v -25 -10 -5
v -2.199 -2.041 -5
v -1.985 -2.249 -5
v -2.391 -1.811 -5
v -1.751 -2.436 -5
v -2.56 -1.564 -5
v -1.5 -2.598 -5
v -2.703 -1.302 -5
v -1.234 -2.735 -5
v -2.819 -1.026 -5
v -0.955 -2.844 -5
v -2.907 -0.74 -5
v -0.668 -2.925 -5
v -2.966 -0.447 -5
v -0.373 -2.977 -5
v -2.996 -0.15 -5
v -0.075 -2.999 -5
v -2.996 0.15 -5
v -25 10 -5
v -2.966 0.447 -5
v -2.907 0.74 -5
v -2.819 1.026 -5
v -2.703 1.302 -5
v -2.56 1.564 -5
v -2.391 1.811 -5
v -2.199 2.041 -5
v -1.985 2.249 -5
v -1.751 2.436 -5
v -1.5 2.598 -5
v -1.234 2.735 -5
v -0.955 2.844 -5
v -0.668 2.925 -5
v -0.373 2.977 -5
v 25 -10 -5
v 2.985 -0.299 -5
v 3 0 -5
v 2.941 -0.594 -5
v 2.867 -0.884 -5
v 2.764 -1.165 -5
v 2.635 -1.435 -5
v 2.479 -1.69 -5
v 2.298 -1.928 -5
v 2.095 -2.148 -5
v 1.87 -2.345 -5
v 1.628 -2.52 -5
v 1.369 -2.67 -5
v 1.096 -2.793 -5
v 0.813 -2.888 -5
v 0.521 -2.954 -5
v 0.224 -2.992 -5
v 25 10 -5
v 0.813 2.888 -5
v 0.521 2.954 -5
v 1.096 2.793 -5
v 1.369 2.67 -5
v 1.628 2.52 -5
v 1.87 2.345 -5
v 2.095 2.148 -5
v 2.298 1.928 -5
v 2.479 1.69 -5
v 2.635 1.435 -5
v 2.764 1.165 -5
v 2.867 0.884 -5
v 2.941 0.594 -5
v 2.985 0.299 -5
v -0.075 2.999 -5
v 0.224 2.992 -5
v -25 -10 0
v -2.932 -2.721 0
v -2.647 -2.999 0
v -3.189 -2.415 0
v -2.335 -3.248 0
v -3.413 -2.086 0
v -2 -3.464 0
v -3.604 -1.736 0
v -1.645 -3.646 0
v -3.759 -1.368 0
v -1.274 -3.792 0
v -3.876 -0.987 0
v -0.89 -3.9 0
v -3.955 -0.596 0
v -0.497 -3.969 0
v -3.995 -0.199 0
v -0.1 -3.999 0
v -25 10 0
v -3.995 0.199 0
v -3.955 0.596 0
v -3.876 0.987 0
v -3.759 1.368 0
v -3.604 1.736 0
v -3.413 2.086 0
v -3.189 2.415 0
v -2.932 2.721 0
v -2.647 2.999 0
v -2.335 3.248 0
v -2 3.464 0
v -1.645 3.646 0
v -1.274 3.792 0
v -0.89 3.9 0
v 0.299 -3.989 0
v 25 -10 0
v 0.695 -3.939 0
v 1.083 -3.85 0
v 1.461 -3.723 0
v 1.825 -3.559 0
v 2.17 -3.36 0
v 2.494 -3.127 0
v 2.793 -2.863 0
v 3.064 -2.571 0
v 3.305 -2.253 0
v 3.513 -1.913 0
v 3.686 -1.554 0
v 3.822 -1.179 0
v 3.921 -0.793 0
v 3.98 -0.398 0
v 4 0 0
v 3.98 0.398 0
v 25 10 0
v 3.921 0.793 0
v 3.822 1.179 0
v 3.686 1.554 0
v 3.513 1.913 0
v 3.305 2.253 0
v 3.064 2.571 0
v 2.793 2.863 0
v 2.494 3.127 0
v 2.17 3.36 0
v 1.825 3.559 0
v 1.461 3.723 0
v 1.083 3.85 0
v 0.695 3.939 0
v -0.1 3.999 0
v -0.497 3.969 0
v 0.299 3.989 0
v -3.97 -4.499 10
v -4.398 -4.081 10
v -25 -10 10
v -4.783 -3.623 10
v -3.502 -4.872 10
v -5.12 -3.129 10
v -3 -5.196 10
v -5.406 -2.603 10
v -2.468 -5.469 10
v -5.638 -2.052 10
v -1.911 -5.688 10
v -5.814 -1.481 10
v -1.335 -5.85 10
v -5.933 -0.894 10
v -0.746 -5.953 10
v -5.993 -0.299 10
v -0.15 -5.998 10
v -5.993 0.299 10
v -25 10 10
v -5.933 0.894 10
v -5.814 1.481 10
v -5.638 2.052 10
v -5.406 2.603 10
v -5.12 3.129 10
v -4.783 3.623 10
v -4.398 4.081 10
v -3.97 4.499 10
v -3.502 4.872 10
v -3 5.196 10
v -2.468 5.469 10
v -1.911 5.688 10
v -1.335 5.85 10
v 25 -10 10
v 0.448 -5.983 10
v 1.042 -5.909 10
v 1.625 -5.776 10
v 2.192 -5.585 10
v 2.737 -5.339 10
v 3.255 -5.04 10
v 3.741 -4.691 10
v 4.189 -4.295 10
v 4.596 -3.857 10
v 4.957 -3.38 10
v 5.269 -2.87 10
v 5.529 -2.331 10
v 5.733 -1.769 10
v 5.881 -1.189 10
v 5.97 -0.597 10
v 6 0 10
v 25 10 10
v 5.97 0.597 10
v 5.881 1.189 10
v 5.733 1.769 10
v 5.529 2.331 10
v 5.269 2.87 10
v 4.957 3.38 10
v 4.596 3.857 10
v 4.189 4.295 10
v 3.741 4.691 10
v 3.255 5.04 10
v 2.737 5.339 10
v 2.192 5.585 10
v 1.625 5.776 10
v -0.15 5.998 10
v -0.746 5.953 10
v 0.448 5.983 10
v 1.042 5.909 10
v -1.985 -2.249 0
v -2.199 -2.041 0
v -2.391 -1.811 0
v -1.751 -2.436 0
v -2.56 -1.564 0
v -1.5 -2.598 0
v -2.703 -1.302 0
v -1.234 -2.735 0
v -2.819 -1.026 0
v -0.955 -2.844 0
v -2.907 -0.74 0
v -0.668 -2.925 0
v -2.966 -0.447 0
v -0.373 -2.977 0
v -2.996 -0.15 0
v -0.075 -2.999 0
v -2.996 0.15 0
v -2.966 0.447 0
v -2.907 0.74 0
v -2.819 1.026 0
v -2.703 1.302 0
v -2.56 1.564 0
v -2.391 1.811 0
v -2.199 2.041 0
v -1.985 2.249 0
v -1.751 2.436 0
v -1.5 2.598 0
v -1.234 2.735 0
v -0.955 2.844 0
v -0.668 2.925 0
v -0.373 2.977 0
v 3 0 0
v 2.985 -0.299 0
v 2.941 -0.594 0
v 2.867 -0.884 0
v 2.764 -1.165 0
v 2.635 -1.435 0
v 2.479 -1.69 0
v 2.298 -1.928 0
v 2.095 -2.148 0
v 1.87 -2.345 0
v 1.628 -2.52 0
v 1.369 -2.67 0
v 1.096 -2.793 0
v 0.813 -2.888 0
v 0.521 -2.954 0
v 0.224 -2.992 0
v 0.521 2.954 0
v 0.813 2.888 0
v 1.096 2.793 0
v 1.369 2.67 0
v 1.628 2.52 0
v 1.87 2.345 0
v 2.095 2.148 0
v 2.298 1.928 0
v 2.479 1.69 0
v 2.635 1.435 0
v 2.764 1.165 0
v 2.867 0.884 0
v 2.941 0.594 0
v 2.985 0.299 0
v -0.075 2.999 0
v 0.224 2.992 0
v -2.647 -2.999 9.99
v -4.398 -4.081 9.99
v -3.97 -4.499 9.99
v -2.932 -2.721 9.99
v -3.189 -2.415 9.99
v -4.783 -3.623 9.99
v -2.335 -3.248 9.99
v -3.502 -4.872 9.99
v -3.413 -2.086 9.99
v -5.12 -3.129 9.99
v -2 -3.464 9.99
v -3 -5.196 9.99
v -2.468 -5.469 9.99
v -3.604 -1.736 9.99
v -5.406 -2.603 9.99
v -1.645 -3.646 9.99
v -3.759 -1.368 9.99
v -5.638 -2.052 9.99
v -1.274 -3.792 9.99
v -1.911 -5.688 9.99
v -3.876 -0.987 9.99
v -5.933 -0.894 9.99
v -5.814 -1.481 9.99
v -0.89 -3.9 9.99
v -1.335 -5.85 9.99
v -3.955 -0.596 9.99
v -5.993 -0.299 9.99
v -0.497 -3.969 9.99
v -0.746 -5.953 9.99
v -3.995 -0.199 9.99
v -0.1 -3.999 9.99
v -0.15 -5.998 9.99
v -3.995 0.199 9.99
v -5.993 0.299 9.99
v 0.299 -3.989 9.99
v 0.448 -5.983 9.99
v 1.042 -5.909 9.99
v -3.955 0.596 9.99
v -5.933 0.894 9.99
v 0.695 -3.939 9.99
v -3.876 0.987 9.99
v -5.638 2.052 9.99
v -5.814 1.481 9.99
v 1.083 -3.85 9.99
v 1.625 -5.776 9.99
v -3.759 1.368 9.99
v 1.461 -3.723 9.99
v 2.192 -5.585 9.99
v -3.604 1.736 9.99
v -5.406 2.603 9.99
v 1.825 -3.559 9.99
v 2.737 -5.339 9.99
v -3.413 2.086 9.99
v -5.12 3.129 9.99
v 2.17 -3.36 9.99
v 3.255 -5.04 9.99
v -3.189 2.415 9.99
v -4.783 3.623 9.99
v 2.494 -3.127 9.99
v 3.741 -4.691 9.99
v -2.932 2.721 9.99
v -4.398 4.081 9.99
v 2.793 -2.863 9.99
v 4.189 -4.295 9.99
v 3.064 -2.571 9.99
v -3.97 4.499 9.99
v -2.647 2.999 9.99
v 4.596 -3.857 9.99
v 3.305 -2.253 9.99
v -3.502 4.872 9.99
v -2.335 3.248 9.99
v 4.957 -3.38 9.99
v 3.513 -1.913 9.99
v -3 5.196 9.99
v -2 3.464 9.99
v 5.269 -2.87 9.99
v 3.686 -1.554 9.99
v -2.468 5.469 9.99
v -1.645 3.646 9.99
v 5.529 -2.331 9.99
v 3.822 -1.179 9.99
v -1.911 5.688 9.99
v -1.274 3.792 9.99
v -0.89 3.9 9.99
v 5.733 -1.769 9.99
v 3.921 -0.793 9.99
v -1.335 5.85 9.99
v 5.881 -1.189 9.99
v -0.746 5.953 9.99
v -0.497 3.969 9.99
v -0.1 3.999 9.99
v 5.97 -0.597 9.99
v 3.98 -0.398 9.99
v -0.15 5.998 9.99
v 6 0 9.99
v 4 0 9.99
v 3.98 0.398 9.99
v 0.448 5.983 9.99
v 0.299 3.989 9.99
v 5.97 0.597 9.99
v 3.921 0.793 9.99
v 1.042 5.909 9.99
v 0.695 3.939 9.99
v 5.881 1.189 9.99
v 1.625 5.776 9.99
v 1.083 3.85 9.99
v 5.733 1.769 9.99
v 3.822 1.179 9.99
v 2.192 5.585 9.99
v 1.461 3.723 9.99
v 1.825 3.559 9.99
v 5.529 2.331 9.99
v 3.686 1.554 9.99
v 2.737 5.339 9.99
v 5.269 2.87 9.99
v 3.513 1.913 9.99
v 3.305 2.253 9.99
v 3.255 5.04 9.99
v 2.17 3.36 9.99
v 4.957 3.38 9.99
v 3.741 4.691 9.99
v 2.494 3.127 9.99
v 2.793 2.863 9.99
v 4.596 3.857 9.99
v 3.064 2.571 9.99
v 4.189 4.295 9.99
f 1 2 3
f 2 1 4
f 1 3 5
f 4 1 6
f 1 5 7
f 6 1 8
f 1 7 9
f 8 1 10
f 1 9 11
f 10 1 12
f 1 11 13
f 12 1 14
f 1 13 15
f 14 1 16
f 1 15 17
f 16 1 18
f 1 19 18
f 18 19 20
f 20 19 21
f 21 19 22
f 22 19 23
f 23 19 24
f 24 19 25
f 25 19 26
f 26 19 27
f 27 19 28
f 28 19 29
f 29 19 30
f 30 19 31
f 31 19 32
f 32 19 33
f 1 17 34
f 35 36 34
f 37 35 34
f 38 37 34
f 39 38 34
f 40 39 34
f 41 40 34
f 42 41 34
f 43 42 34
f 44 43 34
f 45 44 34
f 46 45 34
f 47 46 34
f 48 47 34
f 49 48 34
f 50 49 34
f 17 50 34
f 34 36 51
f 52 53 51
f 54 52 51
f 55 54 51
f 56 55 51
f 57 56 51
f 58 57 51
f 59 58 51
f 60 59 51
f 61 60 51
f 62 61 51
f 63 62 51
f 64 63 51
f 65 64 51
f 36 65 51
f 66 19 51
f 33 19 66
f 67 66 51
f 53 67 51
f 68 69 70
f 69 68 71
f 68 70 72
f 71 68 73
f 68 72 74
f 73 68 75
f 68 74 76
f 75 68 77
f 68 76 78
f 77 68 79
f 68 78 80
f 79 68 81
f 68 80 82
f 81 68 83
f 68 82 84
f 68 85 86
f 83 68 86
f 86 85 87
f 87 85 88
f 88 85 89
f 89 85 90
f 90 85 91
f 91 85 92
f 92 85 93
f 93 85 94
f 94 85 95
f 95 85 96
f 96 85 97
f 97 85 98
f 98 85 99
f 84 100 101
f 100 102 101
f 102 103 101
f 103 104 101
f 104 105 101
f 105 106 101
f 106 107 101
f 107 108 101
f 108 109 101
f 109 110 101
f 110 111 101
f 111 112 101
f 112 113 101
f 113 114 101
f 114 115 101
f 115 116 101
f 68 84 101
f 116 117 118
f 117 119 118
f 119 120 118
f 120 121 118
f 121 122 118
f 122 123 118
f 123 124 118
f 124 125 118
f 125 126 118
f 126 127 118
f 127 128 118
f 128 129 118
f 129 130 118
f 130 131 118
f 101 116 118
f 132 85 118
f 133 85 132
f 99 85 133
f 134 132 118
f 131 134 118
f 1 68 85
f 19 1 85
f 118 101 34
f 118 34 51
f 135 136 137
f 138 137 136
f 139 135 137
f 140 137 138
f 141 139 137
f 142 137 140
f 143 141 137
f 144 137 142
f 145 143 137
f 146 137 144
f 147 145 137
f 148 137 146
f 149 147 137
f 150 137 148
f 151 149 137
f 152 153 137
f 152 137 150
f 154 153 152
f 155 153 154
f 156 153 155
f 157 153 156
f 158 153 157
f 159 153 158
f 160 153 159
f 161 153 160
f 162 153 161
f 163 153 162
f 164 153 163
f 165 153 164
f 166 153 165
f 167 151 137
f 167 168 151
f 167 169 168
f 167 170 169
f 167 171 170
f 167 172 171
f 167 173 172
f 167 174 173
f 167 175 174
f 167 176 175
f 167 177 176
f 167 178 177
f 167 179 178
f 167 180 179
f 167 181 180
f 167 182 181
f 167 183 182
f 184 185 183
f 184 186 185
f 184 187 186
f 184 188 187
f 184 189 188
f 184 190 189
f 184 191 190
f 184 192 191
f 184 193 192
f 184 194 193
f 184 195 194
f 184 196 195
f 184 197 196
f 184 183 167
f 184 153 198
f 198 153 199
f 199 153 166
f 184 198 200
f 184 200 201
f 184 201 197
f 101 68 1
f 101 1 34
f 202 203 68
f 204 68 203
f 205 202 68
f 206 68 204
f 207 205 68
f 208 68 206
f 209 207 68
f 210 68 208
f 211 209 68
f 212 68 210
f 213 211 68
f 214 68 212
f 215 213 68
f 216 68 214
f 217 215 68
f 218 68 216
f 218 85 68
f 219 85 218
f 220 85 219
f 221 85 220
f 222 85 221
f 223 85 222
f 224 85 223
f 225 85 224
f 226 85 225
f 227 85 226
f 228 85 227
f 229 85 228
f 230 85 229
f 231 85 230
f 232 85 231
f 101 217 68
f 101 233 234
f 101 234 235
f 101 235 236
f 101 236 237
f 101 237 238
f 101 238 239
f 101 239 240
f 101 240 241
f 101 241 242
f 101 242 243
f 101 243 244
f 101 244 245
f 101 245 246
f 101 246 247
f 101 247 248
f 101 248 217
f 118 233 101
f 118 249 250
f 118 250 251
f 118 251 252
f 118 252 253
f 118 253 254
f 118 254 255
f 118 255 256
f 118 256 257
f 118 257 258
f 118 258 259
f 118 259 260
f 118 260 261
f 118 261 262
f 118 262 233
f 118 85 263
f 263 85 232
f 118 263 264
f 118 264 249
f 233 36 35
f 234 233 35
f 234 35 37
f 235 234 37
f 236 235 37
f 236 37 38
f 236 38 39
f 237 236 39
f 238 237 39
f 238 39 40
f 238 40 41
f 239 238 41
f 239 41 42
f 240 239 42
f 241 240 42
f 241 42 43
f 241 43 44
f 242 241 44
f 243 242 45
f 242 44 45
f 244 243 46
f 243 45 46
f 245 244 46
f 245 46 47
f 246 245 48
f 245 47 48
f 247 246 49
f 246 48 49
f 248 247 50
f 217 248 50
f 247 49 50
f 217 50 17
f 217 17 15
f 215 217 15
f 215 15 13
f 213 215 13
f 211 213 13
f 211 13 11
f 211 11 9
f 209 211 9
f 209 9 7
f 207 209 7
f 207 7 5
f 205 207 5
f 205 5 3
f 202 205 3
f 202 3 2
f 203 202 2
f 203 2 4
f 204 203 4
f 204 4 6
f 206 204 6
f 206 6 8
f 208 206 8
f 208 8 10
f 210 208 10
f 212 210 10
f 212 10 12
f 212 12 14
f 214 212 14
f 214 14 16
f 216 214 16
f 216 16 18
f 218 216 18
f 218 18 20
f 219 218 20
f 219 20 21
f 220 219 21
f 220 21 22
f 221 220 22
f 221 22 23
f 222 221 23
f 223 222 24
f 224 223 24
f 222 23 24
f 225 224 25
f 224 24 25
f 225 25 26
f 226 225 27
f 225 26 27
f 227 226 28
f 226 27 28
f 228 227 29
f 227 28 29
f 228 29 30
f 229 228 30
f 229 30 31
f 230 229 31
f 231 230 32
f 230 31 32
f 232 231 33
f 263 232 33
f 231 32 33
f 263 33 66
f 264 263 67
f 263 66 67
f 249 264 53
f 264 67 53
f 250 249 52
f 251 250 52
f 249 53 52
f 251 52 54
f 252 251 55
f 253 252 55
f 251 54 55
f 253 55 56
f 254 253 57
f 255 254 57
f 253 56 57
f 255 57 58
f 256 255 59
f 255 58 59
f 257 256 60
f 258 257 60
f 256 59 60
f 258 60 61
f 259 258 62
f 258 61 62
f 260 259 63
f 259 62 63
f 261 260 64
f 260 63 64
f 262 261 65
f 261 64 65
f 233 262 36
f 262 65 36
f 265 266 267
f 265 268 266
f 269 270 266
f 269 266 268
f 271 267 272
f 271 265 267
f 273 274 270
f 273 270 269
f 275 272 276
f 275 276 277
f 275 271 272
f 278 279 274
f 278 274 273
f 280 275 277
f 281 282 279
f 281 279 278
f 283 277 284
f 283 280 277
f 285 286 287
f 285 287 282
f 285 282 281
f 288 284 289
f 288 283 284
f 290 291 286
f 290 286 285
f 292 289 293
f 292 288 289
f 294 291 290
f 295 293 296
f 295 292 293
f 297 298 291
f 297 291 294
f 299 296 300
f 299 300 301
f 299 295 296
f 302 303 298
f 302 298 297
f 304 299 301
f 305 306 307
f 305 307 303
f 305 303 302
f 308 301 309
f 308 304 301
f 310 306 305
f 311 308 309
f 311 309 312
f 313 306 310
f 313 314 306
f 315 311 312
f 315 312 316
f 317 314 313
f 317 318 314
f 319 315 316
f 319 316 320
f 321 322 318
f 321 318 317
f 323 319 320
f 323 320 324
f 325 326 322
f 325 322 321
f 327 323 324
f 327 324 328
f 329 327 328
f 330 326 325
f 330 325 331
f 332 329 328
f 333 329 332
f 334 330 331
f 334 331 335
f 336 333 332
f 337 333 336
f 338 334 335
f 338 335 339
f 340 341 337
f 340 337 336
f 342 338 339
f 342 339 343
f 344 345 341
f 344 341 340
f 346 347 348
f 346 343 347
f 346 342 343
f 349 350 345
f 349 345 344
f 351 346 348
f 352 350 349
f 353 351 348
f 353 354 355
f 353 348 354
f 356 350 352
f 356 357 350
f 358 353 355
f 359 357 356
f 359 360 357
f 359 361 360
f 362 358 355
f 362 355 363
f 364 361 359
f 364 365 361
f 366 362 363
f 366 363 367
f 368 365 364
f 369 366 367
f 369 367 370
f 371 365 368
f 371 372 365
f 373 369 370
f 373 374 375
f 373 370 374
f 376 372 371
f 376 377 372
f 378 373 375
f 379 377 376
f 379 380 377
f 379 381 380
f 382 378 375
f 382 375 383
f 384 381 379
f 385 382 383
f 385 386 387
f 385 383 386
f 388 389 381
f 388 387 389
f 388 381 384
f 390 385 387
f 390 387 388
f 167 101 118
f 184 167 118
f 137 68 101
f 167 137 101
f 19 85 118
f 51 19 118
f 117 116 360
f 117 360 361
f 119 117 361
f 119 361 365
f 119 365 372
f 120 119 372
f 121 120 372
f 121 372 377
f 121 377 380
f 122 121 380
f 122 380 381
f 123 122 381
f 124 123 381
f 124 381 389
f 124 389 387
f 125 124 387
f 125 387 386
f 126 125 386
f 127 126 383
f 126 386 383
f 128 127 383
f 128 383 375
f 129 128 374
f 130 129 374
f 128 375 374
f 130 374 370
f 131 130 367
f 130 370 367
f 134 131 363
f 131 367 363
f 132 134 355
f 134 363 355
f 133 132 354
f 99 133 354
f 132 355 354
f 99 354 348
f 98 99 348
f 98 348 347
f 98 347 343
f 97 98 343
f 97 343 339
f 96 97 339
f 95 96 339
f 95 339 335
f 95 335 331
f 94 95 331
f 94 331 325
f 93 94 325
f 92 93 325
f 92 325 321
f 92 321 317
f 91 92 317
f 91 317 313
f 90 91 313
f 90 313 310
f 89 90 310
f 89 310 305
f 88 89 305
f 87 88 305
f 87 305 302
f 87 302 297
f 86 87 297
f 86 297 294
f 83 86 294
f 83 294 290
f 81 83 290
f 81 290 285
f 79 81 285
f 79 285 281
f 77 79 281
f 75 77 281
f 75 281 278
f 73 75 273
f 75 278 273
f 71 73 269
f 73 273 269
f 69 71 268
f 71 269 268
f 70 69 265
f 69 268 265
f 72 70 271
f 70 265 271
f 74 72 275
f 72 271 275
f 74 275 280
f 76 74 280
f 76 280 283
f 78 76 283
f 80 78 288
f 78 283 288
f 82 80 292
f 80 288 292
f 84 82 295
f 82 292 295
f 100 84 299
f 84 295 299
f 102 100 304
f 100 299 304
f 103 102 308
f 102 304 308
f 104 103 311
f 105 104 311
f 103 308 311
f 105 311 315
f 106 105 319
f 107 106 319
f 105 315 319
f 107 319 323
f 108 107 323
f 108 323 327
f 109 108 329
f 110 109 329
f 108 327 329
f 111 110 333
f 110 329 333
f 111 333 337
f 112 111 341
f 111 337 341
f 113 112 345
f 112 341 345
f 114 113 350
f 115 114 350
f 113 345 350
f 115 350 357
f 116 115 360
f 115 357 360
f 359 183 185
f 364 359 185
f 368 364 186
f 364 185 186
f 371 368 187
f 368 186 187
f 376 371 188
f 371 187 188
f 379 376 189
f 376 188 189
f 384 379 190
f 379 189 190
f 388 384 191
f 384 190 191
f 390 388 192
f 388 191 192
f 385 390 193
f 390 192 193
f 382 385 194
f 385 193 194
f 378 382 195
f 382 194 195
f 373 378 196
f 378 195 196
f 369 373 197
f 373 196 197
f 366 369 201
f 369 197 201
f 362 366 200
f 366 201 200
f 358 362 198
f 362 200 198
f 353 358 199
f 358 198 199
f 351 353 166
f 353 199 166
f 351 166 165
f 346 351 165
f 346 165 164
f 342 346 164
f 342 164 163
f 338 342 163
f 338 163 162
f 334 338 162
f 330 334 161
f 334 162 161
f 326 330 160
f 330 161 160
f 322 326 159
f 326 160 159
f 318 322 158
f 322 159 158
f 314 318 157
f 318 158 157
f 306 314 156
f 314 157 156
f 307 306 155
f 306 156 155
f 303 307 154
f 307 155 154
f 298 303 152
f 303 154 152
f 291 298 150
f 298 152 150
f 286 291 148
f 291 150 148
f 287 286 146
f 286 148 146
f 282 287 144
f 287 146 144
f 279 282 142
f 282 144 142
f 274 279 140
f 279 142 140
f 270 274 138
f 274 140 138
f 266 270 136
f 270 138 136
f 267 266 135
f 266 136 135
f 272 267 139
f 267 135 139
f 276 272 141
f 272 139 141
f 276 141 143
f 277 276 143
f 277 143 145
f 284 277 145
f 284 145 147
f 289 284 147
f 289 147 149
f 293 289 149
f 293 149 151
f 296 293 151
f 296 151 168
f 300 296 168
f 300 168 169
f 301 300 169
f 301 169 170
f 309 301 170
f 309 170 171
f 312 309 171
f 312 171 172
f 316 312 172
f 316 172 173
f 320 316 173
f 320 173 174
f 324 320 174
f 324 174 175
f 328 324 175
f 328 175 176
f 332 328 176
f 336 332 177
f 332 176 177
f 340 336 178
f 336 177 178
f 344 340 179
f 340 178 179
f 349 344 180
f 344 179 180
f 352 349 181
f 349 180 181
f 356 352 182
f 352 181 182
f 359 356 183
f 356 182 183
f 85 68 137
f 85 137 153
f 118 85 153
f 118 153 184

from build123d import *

# Parameters (mm, degrees)
SKETCH_W        = 50
SKETCH_H        = 20
PAD_DEPTH       = 10
SKETCH002_R     = 4
POCKET_DEPTH    = 10.001
SKETCH004_R     = 6
POCKET002_DEPTH = 0.01
SKETCH001_W     = 50
SKETCH001_H     = 20
PAD001_DEPTH    = 5
SKETCH003_R     = 3
POCKET001_DEPTH = 5.001


with BuildPart() as part:
    # Sketch → Pad (new body)
    with BuildSketch(Plane.XY):
        Rectangle(SKETCH_W, SKETCH_H)
    extrude(amount=PAD_DEPTH)

    # Sketch002 → Pocket (cut, through all)
    with BuildSketch(Plane.XY.offset(10)):
        Circle(SKETCH002_R)
    extrude(amount=-POCKET_DEPTH, mode=Mode.SUBTRACT)

    # Sketch004 → Pocket002 (cut)
    with BuildSketch(Plane.XY.offset(10)):
        Circle(SKETCH004_R)
    extrude(amount=-POCKET002_DEPTH, mode=Mode.SUBTRACT)


with BuildPart() as base:
    # Sketch001 → Pad001 (new body)
    with BuildSketch(Plane.XY):
        Rectangle(SKETCH001_W, SKETCH001_H)
    extrude(amount=-PAD001_DEPTH)

    # Sketch003 → Pocket001 (cut, through all)
    with BuildSketch(Plane(origin=(0, 0, -5), x_dir=(1, 0, 0), z_dir=(0, 0, -1))):
        Circle(SKETCH003_R)
    extrude(amount=-POCKET001_DEPTH, mode=Mode.SUBTRACT)


solid = Compound([part.part, base.part])
